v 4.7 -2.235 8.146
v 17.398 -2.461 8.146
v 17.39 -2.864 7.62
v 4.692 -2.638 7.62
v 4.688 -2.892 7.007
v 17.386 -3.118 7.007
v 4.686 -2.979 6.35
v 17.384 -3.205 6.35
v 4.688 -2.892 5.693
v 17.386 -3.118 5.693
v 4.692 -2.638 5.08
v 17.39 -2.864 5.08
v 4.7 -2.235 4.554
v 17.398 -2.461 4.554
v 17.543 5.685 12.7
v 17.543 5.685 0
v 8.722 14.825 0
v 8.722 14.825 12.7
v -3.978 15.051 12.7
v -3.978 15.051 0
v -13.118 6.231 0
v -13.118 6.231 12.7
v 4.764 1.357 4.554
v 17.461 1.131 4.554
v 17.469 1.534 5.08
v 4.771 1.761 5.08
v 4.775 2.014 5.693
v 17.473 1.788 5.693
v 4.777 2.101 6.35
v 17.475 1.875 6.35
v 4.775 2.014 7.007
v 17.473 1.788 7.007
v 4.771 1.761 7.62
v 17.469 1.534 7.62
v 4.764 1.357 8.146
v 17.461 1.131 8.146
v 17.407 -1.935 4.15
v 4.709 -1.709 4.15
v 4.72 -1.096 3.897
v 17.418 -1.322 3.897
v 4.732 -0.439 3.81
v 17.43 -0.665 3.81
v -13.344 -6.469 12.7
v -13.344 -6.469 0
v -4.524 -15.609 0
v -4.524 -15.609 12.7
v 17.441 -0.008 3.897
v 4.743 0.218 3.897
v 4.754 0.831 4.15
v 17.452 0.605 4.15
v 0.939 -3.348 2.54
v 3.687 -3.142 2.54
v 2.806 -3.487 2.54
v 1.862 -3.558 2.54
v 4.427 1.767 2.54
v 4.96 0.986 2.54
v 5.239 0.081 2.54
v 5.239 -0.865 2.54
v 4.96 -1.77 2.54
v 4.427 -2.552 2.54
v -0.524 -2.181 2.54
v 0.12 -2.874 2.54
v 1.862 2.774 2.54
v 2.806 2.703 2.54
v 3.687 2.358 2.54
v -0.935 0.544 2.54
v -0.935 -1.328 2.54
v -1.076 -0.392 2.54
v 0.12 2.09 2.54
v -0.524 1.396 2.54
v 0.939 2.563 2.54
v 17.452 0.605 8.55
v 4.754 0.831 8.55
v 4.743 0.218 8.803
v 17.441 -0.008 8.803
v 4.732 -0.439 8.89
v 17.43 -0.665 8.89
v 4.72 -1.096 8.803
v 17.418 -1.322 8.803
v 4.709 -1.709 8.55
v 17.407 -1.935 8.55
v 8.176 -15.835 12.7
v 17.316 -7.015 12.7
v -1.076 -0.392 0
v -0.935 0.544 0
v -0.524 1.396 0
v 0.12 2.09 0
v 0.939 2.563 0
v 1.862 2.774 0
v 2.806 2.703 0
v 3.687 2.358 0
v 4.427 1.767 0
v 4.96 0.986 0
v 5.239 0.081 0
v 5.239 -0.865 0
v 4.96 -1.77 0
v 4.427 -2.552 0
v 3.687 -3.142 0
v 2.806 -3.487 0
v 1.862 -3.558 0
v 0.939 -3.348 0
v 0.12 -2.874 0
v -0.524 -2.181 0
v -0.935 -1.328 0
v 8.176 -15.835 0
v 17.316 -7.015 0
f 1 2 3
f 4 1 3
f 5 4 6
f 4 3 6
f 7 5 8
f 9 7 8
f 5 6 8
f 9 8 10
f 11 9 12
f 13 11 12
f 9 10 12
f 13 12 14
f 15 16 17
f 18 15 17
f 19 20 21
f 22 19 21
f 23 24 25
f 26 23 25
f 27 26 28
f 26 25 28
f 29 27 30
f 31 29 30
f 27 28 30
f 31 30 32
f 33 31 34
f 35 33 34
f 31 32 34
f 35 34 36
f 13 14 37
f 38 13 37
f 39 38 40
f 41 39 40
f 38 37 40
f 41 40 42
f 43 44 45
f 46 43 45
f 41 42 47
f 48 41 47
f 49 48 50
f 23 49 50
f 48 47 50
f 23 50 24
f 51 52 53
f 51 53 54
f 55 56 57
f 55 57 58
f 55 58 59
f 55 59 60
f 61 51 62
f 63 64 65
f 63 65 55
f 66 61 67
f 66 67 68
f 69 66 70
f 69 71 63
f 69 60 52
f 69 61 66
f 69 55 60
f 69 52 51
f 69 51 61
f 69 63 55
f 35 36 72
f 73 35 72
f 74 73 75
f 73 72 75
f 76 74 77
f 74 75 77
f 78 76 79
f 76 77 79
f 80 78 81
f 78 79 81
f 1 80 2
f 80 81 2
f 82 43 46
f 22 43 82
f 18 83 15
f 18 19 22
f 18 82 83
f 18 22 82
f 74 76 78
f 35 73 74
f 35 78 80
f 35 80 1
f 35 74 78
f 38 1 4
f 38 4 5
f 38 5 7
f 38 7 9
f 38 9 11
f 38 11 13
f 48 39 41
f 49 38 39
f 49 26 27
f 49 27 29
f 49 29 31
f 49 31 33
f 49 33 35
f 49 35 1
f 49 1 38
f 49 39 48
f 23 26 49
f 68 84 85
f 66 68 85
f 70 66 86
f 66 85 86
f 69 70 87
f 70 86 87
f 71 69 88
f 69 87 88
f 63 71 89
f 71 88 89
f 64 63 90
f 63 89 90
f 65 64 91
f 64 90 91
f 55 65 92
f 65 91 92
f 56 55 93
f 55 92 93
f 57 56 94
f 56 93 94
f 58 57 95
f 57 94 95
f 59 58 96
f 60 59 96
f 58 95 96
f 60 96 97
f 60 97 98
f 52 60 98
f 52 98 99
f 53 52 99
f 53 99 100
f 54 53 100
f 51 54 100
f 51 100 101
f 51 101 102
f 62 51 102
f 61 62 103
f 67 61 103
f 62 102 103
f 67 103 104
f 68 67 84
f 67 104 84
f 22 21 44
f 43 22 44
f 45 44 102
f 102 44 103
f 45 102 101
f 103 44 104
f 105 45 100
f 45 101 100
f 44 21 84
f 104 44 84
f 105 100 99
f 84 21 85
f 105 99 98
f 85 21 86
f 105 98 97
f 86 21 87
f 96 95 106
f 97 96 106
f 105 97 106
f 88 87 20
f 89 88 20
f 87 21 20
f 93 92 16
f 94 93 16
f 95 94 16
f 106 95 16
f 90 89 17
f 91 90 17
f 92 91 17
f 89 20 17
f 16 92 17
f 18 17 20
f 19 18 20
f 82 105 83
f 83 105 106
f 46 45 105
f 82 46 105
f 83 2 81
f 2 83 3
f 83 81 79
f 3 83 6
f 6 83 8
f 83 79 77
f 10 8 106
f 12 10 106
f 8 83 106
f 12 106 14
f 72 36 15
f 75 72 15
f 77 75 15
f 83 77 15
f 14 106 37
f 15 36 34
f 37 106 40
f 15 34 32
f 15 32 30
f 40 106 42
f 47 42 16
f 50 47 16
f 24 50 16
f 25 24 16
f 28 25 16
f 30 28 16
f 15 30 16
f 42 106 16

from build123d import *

# Parameters (mm, degrees)
BOSS_EXTRUDE2_DEPTH = 12.7
CUT_EXTRUDE3_DEPTH  = 12.7
SKETCH7_R           = 3.175
CUT_EXTRUDE5_DEPTH  = 2.54


with BuildPart() as part:
    # Sketch5 → Boss-Extrude2 (new body)
    with BuildSketch(Plane.XY):
        Polygon((17.316446729, -7.015021533), (17.542582687, 5.684978467), (8.722228835, 14.825136857), (-3.977771165, 15.051272815), (-13.117929555, 6.230918963), (-13.344065513, -6.469081037), (-4.523711662, -15.609239427), (8.176288338, -15.835375385), align=None)
    extrude(amount=BOSS_EXTRUDE2_DEPTH)

    # Sketch6 → Cut-Extrude3 (cut)
    with BuildSketch(Plane(origin=(17.435827988, -0.310462021, 0), x_dir=(0, 0, -1), z_dir=(0.9998415112072249, -0.017803158900963578, 0))):
        with BuildLine():
            ThreePointArc((-8.14590888, 1.441577842), (-8.89, -0.354615715), (-8.14590888, -2.150809272))
            Line((-8.14590888, -2.150809272), (-6.35, -0.354615715))
            Line((-6.35, -0.354615715), (-8.14590888, 1.441577842))
        make_face()
        with BuildLine():
            Line((-6.35, -0.354615715), (-8.14590888, -2.150809272))
            ThreePointArc((-8.14590888, -2.150809272), (-6.35, -2.894615715), (-4.55409112, -2.150809272))
            Line((-4.55409112, -2.150809272), (-6.35, -0.354615715))
        make_face()
        with BuildLine():
            Line((-8.14590888, 1.441577842), (-6.35, -0.354615715))
            Line((-6.35, -0.354615715), (-4.55409112, 1.441577842))
            ThreePointArc((-4.55409112, 1.441577842), (-6.35, 2.185384285), (-8.14590888, 1.441577842))
        make_face()
        with BuildLine():
            Line((-4.55409112, 1.441577842), (-6.35, -0.354615715))
            Line((-6.35, -0.354615715), (-4.55409112, -2.150809272))
            ThreePointArc((-4.55409112, -2.150809272), (-4.003384506, -1.326724619), (-3.81, -0.354615715))
            ThreePointArc((-3.81, -0.354615715), (-4.003384506, 0.617493189), (-4.55409112, 1.441577842))
        make_face()
    extrude(amount=-CUT_EXTRUDE3_DEPTH, mode=Mode.SUBTRACT)

    # Sketch7 → Cut-Extrude5 (cut)
    with BuildSketch(Plane(origin=(0, 0, 0), x_dir=(-1, 0, 0), z_dir=(0, 0, -1))):
        with Locations((-2.099258587, -0.392051285)):
            Circle(SKETCH7_R)
    extrude(amount=-CUT_EXTRUDE5_DEPTH, mode=Mode.SUBTRACT)


solid = part.part
